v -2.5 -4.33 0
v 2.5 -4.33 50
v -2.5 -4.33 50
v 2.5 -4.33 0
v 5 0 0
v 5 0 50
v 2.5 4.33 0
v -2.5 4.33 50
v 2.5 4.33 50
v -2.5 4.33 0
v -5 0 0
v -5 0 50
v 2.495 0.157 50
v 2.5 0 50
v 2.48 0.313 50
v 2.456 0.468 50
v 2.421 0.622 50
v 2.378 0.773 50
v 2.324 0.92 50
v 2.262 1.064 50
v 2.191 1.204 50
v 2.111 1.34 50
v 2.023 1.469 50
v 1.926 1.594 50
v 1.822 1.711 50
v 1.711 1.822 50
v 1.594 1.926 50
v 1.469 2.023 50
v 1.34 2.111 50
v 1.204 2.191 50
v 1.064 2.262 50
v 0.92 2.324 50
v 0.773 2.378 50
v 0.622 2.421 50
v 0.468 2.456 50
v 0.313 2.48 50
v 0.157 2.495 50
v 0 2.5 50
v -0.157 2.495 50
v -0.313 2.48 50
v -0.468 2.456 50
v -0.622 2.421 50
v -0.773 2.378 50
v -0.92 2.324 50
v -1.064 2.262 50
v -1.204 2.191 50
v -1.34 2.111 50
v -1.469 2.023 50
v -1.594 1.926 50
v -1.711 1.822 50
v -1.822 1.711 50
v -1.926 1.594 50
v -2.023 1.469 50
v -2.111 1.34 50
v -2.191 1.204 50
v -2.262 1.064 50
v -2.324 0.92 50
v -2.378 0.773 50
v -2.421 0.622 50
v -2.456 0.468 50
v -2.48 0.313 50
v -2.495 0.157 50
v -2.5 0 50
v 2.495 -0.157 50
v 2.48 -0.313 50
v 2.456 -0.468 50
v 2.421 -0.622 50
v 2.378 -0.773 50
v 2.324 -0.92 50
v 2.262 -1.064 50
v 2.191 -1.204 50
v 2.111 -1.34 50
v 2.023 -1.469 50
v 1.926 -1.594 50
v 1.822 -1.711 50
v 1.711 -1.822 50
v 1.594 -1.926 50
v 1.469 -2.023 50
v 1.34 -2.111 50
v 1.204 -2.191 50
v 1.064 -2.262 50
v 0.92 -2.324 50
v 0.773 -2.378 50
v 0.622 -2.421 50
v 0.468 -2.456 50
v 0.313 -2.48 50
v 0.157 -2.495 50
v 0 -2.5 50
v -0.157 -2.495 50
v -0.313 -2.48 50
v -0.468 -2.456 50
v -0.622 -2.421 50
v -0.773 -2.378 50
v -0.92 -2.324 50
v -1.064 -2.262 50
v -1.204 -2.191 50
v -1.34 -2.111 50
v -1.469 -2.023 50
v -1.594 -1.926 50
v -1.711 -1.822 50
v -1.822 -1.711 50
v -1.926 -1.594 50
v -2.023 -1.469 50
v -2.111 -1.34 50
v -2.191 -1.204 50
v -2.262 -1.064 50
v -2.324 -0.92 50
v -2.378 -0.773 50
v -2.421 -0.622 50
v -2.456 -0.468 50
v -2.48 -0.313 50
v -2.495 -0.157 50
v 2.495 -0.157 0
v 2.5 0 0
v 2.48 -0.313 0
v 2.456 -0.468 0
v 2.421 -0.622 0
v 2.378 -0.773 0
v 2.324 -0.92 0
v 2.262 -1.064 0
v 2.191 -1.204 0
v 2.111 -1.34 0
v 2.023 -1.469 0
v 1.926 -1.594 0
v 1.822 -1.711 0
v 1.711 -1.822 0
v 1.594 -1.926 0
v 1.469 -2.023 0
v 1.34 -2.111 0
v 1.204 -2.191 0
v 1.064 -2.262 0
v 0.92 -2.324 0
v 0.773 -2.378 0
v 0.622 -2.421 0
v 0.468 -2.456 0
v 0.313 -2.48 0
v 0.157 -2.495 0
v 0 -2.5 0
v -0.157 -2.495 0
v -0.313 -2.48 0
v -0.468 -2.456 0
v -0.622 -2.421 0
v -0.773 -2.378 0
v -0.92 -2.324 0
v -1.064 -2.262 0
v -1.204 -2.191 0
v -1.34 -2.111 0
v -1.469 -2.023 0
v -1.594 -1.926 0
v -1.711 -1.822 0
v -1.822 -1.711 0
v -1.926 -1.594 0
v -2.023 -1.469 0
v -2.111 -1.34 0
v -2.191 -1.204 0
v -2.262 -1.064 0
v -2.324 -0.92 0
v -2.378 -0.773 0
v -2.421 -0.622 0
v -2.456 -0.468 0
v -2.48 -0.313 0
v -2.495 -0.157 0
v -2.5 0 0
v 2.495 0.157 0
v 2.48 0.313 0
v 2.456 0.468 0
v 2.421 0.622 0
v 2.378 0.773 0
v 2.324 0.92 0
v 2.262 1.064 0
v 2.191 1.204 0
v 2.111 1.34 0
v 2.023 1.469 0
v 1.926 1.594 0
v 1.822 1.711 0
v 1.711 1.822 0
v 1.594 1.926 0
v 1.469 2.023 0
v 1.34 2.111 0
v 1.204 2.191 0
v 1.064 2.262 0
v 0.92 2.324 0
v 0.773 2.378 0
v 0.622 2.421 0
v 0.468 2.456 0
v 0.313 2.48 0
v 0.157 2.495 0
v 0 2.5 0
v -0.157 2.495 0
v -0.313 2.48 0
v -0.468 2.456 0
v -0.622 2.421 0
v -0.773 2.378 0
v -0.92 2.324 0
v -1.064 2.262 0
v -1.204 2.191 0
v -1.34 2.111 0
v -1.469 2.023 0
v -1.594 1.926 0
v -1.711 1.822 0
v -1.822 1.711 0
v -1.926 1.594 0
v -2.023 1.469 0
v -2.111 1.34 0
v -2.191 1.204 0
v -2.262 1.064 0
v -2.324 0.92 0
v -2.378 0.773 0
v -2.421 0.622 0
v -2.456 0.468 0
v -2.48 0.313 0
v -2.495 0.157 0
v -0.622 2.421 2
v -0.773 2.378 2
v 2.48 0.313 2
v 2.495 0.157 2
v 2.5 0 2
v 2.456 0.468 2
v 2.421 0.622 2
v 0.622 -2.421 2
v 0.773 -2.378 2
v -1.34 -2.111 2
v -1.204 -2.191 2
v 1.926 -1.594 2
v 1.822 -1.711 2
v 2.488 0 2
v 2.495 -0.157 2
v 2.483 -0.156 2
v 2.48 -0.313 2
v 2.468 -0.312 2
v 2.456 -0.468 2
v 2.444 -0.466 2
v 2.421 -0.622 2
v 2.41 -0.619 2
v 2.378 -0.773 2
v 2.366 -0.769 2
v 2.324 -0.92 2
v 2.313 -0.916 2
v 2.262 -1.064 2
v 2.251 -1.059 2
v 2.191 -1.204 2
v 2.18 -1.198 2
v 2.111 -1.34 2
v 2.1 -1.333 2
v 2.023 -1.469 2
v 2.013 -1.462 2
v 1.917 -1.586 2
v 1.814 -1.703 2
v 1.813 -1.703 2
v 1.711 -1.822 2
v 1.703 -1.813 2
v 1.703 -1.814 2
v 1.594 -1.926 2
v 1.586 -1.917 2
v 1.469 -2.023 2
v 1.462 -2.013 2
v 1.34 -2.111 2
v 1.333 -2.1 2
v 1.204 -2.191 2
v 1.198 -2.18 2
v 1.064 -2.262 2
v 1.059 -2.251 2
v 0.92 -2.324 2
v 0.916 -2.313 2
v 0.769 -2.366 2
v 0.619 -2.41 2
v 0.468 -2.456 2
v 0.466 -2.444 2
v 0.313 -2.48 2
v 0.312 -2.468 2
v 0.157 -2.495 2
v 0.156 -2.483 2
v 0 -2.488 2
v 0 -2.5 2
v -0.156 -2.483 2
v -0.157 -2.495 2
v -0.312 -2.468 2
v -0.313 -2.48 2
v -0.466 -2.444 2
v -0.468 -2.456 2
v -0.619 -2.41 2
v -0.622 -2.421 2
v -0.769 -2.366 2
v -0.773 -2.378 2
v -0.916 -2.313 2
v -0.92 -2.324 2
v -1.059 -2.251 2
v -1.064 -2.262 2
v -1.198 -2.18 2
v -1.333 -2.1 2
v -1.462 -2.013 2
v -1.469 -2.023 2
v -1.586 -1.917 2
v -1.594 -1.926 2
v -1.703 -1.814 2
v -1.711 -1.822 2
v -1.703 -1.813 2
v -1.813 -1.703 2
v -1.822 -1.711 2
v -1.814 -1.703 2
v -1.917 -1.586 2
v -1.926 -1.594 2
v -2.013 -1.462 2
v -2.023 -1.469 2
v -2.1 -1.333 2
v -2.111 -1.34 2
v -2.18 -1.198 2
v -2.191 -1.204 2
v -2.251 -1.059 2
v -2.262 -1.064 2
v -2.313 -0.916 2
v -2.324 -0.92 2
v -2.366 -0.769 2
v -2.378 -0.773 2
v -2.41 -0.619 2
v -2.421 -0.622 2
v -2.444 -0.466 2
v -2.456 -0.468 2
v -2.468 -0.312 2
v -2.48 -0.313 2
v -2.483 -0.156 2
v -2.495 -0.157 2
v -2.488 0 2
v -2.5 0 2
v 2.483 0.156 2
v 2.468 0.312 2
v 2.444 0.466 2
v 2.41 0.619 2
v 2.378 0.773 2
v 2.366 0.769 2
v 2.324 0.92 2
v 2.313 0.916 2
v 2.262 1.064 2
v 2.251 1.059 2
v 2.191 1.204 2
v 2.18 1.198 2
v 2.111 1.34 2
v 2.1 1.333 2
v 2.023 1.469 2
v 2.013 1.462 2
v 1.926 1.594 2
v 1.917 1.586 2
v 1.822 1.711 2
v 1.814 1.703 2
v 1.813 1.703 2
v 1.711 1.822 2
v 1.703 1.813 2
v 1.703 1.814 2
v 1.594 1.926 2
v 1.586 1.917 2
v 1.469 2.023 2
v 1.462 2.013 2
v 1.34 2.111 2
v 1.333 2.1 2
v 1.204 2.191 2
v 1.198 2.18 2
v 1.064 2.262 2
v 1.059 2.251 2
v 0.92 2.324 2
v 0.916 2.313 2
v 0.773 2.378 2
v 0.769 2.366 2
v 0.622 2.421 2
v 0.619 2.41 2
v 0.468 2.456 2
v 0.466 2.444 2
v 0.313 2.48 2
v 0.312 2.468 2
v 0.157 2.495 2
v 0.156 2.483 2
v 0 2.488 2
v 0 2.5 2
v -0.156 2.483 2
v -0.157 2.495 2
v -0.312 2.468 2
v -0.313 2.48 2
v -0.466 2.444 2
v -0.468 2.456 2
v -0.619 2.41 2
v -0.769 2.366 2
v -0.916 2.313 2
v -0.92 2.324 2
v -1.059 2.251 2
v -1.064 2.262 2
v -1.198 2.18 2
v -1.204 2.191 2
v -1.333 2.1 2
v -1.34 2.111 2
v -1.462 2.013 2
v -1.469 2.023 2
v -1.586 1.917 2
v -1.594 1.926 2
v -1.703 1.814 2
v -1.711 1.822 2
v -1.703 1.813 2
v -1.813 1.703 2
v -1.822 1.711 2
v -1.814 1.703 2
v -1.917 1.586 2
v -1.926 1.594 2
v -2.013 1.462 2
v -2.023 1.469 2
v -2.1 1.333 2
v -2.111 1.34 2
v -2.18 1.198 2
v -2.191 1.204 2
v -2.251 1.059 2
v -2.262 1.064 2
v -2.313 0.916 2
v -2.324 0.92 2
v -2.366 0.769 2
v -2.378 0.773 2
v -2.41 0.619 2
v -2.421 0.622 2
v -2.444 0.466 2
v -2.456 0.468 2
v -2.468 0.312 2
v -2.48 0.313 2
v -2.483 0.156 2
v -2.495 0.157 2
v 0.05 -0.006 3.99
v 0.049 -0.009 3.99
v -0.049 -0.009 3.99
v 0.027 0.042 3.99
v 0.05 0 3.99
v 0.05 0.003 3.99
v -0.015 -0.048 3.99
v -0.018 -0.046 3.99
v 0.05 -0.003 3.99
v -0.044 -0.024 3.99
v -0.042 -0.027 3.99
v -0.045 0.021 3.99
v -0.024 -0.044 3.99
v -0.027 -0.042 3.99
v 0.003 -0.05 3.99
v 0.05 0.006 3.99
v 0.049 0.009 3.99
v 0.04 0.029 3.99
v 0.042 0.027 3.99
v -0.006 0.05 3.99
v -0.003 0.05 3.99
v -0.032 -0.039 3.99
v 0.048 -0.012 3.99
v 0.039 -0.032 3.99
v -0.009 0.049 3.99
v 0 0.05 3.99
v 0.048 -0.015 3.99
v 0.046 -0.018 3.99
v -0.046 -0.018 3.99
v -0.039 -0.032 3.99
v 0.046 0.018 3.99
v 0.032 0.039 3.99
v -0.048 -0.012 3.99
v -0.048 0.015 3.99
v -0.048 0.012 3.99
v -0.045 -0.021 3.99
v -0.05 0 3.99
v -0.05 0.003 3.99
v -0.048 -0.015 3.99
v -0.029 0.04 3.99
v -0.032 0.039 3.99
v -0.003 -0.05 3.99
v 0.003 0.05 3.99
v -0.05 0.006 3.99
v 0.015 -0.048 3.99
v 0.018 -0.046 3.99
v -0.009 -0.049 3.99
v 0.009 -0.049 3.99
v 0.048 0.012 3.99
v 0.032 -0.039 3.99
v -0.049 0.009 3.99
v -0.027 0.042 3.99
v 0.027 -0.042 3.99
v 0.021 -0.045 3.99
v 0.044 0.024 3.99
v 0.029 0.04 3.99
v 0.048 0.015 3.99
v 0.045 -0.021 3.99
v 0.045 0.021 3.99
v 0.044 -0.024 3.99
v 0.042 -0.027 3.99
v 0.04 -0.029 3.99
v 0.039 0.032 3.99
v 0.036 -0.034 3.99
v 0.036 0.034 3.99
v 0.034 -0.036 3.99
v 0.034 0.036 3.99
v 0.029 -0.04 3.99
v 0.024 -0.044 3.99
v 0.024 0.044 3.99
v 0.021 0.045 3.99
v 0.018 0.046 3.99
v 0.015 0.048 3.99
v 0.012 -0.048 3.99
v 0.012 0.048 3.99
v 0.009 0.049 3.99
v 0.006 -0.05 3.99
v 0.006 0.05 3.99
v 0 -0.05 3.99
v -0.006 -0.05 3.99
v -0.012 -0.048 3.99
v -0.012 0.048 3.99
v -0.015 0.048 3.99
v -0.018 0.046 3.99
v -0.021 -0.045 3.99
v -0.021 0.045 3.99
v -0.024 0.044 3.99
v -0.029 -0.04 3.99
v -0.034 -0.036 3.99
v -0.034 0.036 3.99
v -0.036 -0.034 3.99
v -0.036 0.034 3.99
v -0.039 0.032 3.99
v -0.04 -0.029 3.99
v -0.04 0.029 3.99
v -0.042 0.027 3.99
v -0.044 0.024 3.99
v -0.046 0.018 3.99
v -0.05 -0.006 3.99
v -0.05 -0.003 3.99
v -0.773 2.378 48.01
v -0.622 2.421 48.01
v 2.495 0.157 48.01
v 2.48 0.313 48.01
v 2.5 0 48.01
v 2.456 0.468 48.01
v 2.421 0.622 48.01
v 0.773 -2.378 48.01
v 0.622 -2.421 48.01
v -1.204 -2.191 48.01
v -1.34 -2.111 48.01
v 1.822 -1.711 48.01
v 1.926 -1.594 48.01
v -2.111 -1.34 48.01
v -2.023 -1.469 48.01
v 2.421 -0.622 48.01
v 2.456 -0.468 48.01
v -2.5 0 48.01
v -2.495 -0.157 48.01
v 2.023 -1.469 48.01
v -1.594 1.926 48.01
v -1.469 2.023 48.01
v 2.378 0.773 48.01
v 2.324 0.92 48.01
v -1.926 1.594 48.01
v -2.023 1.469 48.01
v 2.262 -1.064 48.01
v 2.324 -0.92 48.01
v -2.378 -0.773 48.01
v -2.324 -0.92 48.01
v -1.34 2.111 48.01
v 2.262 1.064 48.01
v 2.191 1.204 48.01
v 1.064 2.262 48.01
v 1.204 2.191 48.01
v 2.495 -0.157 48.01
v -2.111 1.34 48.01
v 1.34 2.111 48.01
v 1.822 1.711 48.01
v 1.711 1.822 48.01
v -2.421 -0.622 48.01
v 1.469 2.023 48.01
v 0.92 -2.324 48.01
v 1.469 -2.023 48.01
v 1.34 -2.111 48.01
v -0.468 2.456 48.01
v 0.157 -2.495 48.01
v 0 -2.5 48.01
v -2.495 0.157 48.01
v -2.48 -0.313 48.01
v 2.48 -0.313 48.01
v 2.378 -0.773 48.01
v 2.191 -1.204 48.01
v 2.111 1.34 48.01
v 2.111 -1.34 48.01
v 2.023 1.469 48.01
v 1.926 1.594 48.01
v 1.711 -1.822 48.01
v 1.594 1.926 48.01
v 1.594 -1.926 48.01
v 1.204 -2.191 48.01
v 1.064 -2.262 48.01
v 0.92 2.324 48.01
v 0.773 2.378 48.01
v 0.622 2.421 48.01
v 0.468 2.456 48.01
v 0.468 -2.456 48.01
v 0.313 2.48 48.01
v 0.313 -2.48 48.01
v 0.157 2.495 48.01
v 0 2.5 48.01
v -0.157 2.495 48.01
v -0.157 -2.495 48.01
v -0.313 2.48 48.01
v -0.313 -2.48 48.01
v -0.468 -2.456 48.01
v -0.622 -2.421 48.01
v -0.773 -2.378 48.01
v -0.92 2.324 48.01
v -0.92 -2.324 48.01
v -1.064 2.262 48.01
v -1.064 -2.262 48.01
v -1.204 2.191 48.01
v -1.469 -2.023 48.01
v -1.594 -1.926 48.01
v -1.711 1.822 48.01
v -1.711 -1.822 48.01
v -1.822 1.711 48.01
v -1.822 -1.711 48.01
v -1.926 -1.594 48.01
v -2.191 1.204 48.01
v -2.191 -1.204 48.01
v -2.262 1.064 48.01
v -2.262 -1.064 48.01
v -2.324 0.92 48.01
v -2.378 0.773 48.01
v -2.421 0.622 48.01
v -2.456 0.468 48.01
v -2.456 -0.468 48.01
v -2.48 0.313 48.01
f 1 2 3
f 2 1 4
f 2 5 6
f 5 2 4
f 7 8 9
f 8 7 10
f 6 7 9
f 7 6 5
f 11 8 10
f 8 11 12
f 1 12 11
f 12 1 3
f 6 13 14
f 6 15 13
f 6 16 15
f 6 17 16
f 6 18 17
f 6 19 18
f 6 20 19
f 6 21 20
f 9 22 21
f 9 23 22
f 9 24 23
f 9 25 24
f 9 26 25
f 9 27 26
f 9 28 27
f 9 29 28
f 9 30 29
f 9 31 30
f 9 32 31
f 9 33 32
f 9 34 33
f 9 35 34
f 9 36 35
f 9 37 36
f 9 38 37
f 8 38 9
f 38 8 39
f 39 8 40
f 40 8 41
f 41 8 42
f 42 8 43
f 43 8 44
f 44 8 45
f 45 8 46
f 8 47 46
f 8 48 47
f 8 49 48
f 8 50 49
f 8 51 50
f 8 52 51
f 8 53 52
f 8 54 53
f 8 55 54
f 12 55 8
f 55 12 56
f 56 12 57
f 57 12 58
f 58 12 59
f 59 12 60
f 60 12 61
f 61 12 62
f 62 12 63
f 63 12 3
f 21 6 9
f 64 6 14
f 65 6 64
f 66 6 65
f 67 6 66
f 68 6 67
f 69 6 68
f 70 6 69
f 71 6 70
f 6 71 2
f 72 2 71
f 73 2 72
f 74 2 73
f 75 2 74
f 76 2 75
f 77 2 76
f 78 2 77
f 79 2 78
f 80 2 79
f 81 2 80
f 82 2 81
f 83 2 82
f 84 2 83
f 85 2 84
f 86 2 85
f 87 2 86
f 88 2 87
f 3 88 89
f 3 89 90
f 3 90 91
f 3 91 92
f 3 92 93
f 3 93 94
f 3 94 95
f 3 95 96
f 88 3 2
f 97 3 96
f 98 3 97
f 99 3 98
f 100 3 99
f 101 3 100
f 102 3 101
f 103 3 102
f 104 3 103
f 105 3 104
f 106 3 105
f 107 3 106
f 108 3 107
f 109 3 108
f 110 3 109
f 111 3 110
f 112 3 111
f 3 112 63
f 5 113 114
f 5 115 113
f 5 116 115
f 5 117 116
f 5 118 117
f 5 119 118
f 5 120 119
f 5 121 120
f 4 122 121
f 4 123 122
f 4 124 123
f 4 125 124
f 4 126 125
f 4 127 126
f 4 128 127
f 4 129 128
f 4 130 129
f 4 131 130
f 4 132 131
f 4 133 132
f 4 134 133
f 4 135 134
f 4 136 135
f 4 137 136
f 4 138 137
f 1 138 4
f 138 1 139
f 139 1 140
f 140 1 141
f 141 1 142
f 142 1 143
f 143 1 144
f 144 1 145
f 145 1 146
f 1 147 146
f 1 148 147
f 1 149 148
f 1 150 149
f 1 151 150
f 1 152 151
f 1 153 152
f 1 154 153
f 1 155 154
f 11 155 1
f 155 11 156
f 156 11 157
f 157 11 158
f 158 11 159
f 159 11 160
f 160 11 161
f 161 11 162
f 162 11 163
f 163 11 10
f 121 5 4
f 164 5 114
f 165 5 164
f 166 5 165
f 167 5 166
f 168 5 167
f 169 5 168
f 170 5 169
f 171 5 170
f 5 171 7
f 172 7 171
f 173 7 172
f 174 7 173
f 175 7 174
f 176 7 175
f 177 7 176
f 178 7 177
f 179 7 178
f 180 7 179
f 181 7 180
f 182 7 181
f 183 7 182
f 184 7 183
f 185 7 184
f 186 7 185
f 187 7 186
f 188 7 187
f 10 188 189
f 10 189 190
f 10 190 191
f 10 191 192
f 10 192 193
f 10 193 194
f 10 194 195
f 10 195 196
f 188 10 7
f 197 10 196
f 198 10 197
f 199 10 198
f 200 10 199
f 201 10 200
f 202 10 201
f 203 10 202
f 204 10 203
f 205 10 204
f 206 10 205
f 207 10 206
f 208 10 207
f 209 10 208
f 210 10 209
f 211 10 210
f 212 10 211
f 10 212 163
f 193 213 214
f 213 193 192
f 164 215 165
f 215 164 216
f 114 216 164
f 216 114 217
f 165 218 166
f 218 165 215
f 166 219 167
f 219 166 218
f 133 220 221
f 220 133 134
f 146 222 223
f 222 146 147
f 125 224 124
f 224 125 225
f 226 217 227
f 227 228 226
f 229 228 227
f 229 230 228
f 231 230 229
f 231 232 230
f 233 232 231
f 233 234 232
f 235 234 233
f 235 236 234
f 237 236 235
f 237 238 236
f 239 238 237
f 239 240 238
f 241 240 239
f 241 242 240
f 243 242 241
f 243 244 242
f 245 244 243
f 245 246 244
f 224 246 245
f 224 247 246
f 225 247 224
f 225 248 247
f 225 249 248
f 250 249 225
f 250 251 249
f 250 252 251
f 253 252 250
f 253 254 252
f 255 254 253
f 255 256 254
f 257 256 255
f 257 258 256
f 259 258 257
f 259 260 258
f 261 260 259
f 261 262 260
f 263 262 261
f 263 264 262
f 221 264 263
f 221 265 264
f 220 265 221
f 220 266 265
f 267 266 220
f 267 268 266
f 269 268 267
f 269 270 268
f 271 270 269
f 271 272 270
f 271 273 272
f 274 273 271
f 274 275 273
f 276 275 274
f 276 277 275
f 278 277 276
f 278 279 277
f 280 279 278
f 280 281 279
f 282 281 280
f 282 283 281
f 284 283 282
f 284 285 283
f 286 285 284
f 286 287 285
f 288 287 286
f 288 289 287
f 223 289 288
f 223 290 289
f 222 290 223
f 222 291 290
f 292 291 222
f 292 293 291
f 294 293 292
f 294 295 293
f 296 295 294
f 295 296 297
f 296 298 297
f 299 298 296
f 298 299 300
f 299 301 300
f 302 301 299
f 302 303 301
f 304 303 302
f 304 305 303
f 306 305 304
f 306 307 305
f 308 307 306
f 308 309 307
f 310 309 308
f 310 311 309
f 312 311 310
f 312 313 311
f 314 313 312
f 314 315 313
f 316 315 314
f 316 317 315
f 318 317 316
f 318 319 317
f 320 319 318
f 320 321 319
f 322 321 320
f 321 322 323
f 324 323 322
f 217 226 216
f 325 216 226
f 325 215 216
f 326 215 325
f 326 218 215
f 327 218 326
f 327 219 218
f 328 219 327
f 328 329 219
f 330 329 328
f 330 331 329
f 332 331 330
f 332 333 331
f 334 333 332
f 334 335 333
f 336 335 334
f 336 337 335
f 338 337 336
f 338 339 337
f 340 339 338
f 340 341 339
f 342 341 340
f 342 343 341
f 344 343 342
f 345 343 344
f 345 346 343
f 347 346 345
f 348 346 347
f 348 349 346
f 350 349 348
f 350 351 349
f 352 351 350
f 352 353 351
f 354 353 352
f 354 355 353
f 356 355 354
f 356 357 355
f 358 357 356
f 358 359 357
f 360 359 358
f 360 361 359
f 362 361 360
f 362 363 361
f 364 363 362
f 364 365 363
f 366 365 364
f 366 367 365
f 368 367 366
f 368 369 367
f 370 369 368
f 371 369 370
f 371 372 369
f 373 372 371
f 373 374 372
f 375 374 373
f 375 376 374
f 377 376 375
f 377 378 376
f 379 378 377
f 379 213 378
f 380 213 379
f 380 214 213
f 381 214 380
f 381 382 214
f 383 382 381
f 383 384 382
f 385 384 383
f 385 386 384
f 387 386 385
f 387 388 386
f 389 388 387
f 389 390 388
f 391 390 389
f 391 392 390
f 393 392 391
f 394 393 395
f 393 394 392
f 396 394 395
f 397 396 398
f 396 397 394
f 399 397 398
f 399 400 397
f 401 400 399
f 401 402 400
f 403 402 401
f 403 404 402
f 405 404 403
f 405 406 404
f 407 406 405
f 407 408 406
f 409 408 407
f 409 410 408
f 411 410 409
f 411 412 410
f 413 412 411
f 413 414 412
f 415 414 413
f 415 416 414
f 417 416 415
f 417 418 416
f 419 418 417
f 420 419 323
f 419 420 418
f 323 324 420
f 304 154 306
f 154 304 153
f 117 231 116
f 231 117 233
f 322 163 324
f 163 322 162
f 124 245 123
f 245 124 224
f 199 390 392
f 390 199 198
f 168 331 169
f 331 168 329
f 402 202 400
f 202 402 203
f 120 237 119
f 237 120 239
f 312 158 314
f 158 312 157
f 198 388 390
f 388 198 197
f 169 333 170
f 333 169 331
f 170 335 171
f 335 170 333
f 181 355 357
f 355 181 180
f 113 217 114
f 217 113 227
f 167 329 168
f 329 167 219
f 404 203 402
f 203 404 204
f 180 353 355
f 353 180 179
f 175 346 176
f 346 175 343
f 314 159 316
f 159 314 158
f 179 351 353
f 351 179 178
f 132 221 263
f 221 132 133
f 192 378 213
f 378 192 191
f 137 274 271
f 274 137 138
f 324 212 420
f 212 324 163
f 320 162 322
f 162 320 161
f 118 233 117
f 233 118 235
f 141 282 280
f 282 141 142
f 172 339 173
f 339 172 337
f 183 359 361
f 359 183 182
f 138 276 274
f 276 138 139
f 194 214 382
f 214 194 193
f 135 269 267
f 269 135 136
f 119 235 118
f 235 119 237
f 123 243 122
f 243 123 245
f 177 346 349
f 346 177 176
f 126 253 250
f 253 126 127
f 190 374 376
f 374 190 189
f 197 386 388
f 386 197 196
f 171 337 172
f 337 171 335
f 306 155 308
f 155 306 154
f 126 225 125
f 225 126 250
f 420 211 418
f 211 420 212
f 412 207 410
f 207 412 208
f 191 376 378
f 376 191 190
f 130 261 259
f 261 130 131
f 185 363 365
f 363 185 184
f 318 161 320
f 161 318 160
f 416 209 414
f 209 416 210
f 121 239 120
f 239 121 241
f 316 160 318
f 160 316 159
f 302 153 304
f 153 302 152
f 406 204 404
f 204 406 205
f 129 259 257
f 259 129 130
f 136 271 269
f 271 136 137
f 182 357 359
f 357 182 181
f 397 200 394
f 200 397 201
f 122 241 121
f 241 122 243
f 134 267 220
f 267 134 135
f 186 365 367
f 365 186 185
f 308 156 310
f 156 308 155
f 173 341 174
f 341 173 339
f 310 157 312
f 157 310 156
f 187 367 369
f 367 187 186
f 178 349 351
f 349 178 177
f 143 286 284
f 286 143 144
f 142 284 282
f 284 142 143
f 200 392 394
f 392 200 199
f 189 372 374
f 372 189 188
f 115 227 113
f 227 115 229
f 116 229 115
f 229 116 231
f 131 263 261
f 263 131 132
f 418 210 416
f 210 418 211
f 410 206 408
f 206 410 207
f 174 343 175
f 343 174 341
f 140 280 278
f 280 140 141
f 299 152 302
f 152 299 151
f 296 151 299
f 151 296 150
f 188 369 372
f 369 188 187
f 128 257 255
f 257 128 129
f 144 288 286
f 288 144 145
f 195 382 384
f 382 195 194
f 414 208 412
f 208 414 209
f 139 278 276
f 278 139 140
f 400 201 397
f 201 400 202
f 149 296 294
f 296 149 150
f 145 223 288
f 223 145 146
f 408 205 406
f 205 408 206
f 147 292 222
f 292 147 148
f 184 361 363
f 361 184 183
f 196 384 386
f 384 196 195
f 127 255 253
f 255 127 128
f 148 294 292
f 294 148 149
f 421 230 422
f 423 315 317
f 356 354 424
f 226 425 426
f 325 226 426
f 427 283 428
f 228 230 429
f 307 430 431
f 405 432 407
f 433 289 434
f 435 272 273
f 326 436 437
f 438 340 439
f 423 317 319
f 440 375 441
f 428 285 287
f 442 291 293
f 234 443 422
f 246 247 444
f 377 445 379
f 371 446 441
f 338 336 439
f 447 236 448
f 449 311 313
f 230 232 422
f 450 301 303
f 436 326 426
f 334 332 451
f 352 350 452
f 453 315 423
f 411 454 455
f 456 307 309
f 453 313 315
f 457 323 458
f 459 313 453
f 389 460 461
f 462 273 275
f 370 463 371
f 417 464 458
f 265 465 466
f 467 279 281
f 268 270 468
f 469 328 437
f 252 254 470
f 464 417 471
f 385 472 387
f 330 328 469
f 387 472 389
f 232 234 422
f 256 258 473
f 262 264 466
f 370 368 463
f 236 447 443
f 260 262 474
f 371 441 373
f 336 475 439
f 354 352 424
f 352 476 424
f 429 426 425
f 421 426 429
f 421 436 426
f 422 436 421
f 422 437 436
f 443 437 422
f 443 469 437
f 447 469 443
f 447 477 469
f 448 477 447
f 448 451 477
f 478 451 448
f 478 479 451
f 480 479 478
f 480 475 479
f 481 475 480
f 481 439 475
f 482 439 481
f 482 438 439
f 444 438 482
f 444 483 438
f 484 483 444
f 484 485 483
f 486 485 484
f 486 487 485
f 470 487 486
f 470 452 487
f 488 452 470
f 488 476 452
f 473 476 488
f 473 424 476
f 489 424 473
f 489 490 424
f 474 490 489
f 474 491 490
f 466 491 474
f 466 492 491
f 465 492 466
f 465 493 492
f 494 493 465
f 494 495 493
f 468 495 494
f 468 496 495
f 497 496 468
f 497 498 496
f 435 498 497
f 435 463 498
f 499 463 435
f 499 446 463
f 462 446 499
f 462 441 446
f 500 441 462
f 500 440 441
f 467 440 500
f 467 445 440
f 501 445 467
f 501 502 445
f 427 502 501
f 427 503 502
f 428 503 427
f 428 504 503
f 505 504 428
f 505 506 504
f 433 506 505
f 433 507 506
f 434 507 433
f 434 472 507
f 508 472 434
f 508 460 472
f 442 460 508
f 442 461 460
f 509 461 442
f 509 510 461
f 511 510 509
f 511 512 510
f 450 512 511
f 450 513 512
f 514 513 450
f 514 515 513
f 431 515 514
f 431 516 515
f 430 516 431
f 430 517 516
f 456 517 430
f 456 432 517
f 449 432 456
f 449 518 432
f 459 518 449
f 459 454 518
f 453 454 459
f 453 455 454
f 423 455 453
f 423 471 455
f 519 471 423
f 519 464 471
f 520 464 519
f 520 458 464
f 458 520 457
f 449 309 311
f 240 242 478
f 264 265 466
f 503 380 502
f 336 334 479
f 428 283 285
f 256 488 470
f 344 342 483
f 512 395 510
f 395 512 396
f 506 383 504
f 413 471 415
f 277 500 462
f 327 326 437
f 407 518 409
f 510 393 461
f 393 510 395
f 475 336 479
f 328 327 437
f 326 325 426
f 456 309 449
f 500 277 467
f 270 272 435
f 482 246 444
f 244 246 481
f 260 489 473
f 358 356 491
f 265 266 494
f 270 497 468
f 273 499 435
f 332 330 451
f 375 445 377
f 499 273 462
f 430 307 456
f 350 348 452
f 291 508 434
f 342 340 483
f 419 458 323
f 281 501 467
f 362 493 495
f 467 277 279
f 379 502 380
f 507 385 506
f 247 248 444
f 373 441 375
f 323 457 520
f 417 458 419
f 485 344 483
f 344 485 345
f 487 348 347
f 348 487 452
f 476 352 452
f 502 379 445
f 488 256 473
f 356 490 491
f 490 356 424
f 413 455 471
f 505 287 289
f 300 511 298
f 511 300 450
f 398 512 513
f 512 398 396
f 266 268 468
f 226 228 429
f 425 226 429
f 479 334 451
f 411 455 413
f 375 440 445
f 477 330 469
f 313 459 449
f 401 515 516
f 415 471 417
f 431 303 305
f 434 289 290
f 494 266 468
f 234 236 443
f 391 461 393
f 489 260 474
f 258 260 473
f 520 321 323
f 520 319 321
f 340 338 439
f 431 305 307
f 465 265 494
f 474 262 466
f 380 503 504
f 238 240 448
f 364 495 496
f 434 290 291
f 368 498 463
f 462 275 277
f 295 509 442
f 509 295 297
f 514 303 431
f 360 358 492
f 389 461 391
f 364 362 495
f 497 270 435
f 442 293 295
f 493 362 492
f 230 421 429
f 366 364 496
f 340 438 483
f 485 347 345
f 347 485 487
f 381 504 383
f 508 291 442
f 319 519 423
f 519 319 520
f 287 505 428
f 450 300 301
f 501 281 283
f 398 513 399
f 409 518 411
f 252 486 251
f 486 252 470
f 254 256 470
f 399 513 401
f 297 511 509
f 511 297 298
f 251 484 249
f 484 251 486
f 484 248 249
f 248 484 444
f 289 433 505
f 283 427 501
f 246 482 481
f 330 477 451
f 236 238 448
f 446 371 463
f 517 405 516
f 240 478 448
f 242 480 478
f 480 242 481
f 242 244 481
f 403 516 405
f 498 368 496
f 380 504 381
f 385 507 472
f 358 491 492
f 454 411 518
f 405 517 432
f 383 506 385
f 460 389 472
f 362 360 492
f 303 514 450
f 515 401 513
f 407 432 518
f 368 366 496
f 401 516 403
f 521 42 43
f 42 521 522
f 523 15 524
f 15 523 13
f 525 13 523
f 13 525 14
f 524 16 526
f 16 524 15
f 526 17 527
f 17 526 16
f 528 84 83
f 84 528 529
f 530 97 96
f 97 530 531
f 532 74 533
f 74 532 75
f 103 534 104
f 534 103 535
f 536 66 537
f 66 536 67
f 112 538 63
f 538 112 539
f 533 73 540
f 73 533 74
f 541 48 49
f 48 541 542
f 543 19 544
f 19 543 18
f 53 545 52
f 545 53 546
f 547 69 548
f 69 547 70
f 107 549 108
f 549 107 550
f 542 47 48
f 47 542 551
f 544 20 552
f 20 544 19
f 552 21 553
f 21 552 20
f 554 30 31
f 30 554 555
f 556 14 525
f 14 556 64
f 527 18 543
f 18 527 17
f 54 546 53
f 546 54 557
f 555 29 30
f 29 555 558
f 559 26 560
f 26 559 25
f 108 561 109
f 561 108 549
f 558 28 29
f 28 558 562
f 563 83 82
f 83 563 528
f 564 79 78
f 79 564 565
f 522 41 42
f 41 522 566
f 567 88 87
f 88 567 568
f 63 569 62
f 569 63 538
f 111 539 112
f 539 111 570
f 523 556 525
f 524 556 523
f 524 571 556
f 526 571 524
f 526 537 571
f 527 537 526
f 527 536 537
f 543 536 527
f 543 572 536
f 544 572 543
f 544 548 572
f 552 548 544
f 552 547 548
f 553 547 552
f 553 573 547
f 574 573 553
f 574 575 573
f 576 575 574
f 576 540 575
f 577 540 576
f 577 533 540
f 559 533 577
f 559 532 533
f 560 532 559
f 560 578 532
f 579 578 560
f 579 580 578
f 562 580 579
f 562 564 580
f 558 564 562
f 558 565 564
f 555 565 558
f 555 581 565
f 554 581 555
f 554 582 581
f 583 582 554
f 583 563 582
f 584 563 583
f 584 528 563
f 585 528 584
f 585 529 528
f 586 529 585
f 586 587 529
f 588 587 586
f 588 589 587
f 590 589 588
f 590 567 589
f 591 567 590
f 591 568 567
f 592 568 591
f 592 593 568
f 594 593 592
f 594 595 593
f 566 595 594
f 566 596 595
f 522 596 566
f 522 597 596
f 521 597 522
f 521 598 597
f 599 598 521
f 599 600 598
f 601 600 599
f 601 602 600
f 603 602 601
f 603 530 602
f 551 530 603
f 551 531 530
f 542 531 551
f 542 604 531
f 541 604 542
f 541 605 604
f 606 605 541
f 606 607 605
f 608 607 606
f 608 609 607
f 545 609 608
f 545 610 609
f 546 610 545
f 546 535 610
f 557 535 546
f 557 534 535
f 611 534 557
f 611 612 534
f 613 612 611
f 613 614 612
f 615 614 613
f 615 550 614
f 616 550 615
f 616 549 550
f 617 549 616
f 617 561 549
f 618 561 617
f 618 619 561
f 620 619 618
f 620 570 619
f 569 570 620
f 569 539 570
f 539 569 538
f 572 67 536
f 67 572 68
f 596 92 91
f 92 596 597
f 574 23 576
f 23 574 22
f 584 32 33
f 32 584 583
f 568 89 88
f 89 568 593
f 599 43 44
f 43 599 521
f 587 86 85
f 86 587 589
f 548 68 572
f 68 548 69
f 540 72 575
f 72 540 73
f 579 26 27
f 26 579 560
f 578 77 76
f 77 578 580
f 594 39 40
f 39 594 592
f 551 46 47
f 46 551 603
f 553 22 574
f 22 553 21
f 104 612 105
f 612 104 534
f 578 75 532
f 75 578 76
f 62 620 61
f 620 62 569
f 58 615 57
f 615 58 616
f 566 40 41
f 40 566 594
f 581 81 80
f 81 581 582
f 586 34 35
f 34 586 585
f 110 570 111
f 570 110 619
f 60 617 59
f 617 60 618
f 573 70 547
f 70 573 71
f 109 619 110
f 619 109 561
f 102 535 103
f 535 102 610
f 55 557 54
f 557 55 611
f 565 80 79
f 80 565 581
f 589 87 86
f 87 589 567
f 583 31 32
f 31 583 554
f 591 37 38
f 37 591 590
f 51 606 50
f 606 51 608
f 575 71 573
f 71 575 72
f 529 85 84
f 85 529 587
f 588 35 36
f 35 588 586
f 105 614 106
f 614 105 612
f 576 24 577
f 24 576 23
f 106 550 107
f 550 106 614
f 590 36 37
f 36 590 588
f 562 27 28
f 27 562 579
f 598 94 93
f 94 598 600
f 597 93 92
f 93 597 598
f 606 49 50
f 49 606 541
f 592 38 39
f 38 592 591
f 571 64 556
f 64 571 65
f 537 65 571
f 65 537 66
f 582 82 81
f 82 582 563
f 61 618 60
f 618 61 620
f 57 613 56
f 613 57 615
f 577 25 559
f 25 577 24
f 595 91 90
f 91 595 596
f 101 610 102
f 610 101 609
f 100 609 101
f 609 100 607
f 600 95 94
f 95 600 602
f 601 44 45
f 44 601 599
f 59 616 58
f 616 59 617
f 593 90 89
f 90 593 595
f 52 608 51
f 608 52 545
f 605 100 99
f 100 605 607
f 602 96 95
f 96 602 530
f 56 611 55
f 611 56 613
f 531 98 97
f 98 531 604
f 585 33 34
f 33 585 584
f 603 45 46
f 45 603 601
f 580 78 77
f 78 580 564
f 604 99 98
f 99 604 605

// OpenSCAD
$fn=100;

difference() {
   cylinder($fn=6,d=10,h=50);
   translate([0,0,-0.01]) cylinder(d=5,h=2.01);
   translate([0,0,1.99]) cylinder(d1=5,d2=0.1,h=2);
   translate([0,0,50-1.99]) cylinder(d=5,h=2);
}
